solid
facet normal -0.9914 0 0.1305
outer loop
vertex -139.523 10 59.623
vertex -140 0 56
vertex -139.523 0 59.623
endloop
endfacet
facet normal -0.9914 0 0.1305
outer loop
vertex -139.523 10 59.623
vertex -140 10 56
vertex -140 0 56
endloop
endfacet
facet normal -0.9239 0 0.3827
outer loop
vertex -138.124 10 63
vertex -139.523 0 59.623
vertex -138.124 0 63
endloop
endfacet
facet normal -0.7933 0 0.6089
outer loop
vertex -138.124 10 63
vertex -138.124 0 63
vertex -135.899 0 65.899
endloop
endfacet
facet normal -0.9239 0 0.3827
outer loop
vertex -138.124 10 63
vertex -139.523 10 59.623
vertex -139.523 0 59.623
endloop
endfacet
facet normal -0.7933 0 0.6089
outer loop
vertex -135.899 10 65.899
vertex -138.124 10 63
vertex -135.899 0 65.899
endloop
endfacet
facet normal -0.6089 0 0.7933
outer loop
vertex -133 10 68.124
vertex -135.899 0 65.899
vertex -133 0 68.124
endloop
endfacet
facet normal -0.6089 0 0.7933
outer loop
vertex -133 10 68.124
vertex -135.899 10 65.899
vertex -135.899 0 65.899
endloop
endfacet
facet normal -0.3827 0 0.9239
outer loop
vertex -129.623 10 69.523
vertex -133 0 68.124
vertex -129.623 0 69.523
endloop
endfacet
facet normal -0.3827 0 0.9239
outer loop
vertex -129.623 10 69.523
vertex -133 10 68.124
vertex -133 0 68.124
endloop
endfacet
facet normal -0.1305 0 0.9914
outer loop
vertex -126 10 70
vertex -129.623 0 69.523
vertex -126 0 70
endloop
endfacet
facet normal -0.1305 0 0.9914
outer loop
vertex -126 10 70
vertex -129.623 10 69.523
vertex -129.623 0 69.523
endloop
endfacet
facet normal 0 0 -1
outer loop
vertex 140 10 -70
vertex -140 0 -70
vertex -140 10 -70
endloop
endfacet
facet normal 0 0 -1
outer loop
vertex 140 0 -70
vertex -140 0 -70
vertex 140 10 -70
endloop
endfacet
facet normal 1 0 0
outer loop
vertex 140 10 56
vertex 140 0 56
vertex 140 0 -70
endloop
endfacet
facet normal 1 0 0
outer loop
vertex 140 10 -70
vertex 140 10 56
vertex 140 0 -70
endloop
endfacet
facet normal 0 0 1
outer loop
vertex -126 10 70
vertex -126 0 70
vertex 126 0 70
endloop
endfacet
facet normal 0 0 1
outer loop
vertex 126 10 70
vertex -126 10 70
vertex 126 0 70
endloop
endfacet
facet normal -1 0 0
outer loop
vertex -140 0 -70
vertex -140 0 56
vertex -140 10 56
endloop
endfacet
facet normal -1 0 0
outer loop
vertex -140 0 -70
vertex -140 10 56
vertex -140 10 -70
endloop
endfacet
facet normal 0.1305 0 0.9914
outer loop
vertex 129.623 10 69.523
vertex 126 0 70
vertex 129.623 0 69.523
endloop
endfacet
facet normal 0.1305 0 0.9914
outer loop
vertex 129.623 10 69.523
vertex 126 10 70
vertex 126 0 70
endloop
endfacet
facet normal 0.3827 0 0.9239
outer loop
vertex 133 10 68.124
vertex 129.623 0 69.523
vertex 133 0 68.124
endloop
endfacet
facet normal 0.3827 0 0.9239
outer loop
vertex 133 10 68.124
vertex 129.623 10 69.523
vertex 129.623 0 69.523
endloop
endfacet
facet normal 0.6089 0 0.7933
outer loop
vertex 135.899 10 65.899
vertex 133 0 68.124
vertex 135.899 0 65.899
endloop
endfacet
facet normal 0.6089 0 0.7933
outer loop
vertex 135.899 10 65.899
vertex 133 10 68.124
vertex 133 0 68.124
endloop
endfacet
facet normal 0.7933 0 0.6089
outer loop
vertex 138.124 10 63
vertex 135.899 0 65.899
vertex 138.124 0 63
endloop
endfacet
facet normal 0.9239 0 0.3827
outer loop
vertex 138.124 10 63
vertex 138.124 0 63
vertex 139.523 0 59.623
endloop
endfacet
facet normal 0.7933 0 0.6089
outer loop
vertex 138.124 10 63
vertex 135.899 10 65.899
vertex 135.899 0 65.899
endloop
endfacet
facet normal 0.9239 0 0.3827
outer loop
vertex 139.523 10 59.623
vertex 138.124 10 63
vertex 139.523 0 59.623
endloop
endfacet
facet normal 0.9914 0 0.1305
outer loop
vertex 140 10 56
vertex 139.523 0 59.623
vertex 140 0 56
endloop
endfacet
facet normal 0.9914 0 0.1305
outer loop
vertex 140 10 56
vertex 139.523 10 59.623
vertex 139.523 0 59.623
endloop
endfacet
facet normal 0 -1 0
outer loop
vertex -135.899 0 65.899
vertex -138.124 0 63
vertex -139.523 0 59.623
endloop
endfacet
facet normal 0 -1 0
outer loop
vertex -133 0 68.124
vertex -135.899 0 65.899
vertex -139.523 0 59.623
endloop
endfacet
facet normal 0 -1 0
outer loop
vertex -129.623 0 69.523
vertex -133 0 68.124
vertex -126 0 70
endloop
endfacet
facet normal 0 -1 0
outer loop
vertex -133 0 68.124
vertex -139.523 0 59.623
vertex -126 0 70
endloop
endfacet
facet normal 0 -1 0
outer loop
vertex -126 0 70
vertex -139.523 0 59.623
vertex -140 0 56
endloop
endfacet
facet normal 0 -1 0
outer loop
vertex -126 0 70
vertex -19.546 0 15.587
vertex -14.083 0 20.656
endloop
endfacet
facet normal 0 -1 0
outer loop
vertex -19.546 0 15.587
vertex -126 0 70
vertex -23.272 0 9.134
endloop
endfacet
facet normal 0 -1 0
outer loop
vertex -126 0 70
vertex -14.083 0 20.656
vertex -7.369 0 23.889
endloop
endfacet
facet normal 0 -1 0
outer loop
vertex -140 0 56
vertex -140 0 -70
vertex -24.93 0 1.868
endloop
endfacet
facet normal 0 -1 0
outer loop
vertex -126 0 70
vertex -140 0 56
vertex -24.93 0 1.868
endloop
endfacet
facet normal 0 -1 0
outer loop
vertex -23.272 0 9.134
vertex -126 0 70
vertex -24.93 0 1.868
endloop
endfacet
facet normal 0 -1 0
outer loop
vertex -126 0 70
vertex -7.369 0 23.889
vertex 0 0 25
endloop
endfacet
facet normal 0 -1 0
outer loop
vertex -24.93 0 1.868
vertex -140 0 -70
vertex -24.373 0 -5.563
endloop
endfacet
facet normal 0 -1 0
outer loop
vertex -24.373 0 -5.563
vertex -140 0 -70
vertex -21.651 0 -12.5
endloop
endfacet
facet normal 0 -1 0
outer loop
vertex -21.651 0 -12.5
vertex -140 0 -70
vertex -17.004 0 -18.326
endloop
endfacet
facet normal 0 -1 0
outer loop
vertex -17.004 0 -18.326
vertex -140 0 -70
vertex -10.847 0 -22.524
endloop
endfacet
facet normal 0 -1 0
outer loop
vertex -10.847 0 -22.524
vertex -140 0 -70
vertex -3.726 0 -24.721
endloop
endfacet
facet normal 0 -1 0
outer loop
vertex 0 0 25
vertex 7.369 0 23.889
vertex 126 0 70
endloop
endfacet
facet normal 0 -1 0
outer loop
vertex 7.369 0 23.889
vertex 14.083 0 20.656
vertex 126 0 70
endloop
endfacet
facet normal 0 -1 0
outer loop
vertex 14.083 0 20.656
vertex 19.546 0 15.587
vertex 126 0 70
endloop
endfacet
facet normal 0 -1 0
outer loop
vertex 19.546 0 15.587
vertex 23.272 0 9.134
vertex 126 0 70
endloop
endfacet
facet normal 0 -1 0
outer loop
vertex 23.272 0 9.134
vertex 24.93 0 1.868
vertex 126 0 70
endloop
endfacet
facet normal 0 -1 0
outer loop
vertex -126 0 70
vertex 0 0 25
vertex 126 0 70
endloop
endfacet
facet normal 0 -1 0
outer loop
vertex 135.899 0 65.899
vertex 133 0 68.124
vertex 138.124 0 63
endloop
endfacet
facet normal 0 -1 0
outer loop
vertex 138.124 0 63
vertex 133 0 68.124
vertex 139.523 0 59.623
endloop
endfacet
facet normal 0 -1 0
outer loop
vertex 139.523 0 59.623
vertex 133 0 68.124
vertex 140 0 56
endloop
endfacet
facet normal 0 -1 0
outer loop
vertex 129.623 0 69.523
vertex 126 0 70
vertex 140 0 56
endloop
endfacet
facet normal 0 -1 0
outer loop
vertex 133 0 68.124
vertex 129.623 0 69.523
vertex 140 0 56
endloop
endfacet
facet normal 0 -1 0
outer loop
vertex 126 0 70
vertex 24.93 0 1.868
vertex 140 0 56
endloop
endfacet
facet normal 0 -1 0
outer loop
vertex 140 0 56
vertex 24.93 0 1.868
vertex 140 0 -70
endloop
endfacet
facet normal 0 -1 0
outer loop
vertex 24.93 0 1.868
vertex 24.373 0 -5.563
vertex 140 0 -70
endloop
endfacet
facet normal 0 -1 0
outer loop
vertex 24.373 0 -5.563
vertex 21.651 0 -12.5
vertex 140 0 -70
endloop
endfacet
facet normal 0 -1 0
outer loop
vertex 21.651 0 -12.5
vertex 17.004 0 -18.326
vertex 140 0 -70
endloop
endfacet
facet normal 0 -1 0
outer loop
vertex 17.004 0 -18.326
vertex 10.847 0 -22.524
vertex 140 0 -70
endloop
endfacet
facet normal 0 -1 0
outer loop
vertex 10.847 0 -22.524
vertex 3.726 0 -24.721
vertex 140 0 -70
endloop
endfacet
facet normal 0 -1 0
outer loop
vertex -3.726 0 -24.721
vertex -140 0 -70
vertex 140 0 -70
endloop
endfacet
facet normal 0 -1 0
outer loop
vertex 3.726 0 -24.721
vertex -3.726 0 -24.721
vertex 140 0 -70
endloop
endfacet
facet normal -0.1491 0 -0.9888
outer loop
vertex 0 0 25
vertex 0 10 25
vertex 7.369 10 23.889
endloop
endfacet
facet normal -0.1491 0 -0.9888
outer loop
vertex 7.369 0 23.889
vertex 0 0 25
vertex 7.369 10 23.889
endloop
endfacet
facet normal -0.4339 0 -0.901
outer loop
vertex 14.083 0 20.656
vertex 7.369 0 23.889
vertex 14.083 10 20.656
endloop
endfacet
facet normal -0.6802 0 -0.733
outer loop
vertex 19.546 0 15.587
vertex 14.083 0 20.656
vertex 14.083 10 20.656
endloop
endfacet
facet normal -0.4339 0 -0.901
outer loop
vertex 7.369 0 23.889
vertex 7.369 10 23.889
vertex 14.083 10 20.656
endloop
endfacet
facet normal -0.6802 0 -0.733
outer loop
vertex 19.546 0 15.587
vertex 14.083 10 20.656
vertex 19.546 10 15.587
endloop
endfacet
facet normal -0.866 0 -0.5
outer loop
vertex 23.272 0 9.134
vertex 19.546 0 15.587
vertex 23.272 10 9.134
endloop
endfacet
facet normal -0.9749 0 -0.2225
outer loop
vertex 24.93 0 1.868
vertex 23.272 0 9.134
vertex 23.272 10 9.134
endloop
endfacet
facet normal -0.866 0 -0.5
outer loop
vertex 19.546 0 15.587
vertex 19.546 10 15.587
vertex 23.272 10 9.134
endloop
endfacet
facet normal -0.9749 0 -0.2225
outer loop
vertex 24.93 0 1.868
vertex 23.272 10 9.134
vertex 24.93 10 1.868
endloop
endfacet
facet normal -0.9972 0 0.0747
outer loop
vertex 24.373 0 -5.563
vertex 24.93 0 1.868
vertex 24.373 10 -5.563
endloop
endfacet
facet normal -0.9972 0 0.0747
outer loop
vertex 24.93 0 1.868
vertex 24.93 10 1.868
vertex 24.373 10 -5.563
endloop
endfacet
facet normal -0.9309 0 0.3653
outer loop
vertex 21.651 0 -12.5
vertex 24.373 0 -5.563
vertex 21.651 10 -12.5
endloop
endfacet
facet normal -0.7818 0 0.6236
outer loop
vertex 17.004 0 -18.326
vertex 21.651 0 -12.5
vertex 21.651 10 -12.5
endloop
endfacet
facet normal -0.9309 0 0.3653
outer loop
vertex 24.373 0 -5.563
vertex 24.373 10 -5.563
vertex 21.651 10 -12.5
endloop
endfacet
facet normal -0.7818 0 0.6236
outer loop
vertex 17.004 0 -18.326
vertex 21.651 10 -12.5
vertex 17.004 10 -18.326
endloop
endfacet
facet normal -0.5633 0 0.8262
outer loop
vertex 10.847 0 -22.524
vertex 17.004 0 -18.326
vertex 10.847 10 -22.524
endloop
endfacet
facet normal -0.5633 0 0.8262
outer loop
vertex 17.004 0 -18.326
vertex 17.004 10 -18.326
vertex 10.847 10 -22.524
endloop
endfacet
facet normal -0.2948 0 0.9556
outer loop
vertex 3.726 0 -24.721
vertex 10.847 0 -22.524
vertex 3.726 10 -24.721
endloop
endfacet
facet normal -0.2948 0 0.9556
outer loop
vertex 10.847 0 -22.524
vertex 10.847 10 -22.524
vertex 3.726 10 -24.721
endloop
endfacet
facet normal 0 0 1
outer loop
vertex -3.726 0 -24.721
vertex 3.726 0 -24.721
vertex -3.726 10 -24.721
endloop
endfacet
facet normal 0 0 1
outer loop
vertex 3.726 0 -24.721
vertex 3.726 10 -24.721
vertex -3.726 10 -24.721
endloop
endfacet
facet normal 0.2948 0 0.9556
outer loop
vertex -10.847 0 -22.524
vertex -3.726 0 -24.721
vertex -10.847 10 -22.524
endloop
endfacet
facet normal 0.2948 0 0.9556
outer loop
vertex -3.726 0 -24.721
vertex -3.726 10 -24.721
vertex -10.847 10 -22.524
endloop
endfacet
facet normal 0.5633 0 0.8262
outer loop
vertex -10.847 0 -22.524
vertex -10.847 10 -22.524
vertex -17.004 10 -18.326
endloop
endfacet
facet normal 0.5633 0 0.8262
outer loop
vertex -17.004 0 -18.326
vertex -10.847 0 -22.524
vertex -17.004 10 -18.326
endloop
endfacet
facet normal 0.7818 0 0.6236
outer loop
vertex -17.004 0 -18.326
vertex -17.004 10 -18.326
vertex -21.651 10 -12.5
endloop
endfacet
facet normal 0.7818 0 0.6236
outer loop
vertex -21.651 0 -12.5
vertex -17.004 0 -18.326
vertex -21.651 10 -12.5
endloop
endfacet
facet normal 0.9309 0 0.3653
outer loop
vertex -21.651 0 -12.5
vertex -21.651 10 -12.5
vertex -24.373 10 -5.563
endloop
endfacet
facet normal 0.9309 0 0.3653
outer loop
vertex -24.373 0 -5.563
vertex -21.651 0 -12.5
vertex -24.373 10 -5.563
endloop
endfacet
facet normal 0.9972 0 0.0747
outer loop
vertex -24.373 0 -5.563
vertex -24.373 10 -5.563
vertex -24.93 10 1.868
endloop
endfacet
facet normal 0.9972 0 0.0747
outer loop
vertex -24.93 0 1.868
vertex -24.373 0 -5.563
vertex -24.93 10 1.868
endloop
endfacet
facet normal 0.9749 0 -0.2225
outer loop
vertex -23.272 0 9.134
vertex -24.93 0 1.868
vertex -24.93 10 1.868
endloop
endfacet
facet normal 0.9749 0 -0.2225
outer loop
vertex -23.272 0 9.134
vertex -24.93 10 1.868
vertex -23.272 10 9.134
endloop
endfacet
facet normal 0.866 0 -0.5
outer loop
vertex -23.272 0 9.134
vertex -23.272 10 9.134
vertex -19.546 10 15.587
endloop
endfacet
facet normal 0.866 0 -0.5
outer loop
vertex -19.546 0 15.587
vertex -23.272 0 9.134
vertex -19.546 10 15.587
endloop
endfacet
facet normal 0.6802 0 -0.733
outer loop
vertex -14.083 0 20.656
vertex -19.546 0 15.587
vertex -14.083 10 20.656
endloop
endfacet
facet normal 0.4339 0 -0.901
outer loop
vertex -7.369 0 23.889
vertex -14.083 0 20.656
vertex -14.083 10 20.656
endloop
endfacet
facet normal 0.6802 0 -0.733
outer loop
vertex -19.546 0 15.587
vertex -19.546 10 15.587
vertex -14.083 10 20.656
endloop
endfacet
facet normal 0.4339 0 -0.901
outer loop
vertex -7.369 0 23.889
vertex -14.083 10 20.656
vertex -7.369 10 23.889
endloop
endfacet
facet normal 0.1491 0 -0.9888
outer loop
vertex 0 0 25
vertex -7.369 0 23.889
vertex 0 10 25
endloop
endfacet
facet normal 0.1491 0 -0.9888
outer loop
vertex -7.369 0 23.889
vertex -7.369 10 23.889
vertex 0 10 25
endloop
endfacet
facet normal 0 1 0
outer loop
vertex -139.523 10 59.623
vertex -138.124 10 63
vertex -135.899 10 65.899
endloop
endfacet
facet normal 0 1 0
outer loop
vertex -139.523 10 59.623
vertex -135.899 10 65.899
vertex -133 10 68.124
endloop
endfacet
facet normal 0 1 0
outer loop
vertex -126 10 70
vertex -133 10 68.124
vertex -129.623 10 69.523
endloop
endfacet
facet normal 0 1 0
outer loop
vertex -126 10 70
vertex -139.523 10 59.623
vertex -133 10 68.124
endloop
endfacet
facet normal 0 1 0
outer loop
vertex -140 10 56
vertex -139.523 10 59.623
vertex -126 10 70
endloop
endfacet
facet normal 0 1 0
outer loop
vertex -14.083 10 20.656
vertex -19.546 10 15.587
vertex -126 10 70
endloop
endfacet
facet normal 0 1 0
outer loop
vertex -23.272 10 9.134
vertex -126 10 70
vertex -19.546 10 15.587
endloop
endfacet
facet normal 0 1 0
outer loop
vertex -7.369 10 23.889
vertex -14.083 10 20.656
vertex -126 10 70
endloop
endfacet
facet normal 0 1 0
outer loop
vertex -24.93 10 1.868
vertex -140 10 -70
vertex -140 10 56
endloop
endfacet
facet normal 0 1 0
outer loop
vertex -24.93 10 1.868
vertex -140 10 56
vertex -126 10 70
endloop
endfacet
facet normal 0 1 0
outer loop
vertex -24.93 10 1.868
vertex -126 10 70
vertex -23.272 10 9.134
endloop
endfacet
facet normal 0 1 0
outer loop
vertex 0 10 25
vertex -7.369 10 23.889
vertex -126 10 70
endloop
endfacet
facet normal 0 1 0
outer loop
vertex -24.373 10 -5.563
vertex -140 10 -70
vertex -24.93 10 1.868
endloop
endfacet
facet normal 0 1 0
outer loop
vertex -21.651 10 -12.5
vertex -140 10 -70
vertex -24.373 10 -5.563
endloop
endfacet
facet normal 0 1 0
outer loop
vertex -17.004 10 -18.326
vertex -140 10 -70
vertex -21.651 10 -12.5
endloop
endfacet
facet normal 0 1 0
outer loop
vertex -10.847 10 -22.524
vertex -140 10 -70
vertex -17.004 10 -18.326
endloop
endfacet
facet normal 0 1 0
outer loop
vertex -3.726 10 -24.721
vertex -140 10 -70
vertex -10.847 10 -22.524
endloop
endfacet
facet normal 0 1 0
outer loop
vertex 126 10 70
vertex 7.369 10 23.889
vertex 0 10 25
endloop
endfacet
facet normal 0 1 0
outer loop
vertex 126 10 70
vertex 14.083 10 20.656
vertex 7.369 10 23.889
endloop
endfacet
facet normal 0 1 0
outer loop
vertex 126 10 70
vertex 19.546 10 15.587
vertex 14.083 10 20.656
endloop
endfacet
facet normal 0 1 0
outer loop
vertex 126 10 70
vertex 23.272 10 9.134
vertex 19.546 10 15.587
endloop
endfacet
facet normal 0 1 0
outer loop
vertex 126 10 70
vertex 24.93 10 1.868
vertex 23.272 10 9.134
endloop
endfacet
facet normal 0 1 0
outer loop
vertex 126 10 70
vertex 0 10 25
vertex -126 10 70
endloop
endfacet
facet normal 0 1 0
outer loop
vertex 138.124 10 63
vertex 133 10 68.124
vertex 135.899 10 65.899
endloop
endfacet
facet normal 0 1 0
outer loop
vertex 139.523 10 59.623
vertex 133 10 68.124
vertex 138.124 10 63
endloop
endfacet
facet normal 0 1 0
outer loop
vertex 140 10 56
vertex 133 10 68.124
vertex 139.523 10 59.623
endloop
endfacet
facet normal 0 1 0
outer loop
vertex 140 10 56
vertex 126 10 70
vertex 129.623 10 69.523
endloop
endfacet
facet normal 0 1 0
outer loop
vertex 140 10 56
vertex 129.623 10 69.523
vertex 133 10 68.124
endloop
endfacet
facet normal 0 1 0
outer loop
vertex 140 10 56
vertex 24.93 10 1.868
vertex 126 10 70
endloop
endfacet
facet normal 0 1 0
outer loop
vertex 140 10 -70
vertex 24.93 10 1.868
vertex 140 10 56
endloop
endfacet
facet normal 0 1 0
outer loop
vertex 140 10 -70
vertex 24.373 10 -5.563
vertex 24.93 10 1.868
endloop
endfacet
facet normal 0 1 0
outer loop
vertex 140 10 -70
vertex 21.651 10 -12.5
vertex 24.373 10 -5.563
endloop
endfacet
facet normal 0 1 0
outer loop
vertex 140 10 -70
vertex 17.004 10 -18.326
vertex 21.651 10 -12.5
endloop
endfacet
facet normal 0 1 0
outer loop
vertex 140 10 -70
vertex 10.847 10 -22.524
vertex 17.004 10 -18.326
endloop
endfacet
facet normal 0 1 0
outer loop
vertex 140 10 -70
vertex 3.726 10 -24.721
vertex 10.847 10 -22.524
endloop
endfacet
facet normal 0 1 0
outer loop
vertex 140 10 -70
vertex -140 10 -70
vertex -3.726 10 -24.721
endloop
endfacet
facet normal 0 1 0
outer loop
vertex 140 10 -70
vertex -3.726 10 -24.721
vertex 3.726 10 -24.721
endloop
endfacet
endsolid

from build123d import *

# Parameters (mm, degrees)
SKETCH1_W           = 280
SKETCH1_H           = 140
BOSS_EXTRUDE1_DEPTH = 10
FILLET1_R           = 14
SKETCH2_R           = 25
CUT_EXTRUDE1_DEPTH  = 10


with BuildPart() as part:
    # Sketch1 → Boss-Extrude1 (new body)
    with BuildSketch(Plane(origin=(0, 0, 0), x_dir=(1, 0, 0), z_dir=(0, 1, 0))):
        Rectangle(SKETCH1_W, SKETCH1_H)
    extrude(amount=BOSS_EXTRUDE1_DEPTH)

    # Fillet1
    fillet1_edges = [part.edges().sort_by_distance(p)[0] for p in [
        (140, 5, 70),
        (-140, 5, 70),
    ]]
    fillet(fillet1_edges, radius=FILLET1_R)

    # Sketch2 → Cut-Extrude1 (cut)
    with BuildSketch(Plane(origin=(0, 10, 0), x_dir=(1, 0, 0), z_dir=(0, 1, 0))):
        with Locations(Location((0, 0, 0), (0, 0, 270))):
            Circle(SKETCH2_R)
    extrude(amount=-CUT_EXTRUDE1_DEPTH, mode=Mode.SUBTRACT)


solid = part.part
